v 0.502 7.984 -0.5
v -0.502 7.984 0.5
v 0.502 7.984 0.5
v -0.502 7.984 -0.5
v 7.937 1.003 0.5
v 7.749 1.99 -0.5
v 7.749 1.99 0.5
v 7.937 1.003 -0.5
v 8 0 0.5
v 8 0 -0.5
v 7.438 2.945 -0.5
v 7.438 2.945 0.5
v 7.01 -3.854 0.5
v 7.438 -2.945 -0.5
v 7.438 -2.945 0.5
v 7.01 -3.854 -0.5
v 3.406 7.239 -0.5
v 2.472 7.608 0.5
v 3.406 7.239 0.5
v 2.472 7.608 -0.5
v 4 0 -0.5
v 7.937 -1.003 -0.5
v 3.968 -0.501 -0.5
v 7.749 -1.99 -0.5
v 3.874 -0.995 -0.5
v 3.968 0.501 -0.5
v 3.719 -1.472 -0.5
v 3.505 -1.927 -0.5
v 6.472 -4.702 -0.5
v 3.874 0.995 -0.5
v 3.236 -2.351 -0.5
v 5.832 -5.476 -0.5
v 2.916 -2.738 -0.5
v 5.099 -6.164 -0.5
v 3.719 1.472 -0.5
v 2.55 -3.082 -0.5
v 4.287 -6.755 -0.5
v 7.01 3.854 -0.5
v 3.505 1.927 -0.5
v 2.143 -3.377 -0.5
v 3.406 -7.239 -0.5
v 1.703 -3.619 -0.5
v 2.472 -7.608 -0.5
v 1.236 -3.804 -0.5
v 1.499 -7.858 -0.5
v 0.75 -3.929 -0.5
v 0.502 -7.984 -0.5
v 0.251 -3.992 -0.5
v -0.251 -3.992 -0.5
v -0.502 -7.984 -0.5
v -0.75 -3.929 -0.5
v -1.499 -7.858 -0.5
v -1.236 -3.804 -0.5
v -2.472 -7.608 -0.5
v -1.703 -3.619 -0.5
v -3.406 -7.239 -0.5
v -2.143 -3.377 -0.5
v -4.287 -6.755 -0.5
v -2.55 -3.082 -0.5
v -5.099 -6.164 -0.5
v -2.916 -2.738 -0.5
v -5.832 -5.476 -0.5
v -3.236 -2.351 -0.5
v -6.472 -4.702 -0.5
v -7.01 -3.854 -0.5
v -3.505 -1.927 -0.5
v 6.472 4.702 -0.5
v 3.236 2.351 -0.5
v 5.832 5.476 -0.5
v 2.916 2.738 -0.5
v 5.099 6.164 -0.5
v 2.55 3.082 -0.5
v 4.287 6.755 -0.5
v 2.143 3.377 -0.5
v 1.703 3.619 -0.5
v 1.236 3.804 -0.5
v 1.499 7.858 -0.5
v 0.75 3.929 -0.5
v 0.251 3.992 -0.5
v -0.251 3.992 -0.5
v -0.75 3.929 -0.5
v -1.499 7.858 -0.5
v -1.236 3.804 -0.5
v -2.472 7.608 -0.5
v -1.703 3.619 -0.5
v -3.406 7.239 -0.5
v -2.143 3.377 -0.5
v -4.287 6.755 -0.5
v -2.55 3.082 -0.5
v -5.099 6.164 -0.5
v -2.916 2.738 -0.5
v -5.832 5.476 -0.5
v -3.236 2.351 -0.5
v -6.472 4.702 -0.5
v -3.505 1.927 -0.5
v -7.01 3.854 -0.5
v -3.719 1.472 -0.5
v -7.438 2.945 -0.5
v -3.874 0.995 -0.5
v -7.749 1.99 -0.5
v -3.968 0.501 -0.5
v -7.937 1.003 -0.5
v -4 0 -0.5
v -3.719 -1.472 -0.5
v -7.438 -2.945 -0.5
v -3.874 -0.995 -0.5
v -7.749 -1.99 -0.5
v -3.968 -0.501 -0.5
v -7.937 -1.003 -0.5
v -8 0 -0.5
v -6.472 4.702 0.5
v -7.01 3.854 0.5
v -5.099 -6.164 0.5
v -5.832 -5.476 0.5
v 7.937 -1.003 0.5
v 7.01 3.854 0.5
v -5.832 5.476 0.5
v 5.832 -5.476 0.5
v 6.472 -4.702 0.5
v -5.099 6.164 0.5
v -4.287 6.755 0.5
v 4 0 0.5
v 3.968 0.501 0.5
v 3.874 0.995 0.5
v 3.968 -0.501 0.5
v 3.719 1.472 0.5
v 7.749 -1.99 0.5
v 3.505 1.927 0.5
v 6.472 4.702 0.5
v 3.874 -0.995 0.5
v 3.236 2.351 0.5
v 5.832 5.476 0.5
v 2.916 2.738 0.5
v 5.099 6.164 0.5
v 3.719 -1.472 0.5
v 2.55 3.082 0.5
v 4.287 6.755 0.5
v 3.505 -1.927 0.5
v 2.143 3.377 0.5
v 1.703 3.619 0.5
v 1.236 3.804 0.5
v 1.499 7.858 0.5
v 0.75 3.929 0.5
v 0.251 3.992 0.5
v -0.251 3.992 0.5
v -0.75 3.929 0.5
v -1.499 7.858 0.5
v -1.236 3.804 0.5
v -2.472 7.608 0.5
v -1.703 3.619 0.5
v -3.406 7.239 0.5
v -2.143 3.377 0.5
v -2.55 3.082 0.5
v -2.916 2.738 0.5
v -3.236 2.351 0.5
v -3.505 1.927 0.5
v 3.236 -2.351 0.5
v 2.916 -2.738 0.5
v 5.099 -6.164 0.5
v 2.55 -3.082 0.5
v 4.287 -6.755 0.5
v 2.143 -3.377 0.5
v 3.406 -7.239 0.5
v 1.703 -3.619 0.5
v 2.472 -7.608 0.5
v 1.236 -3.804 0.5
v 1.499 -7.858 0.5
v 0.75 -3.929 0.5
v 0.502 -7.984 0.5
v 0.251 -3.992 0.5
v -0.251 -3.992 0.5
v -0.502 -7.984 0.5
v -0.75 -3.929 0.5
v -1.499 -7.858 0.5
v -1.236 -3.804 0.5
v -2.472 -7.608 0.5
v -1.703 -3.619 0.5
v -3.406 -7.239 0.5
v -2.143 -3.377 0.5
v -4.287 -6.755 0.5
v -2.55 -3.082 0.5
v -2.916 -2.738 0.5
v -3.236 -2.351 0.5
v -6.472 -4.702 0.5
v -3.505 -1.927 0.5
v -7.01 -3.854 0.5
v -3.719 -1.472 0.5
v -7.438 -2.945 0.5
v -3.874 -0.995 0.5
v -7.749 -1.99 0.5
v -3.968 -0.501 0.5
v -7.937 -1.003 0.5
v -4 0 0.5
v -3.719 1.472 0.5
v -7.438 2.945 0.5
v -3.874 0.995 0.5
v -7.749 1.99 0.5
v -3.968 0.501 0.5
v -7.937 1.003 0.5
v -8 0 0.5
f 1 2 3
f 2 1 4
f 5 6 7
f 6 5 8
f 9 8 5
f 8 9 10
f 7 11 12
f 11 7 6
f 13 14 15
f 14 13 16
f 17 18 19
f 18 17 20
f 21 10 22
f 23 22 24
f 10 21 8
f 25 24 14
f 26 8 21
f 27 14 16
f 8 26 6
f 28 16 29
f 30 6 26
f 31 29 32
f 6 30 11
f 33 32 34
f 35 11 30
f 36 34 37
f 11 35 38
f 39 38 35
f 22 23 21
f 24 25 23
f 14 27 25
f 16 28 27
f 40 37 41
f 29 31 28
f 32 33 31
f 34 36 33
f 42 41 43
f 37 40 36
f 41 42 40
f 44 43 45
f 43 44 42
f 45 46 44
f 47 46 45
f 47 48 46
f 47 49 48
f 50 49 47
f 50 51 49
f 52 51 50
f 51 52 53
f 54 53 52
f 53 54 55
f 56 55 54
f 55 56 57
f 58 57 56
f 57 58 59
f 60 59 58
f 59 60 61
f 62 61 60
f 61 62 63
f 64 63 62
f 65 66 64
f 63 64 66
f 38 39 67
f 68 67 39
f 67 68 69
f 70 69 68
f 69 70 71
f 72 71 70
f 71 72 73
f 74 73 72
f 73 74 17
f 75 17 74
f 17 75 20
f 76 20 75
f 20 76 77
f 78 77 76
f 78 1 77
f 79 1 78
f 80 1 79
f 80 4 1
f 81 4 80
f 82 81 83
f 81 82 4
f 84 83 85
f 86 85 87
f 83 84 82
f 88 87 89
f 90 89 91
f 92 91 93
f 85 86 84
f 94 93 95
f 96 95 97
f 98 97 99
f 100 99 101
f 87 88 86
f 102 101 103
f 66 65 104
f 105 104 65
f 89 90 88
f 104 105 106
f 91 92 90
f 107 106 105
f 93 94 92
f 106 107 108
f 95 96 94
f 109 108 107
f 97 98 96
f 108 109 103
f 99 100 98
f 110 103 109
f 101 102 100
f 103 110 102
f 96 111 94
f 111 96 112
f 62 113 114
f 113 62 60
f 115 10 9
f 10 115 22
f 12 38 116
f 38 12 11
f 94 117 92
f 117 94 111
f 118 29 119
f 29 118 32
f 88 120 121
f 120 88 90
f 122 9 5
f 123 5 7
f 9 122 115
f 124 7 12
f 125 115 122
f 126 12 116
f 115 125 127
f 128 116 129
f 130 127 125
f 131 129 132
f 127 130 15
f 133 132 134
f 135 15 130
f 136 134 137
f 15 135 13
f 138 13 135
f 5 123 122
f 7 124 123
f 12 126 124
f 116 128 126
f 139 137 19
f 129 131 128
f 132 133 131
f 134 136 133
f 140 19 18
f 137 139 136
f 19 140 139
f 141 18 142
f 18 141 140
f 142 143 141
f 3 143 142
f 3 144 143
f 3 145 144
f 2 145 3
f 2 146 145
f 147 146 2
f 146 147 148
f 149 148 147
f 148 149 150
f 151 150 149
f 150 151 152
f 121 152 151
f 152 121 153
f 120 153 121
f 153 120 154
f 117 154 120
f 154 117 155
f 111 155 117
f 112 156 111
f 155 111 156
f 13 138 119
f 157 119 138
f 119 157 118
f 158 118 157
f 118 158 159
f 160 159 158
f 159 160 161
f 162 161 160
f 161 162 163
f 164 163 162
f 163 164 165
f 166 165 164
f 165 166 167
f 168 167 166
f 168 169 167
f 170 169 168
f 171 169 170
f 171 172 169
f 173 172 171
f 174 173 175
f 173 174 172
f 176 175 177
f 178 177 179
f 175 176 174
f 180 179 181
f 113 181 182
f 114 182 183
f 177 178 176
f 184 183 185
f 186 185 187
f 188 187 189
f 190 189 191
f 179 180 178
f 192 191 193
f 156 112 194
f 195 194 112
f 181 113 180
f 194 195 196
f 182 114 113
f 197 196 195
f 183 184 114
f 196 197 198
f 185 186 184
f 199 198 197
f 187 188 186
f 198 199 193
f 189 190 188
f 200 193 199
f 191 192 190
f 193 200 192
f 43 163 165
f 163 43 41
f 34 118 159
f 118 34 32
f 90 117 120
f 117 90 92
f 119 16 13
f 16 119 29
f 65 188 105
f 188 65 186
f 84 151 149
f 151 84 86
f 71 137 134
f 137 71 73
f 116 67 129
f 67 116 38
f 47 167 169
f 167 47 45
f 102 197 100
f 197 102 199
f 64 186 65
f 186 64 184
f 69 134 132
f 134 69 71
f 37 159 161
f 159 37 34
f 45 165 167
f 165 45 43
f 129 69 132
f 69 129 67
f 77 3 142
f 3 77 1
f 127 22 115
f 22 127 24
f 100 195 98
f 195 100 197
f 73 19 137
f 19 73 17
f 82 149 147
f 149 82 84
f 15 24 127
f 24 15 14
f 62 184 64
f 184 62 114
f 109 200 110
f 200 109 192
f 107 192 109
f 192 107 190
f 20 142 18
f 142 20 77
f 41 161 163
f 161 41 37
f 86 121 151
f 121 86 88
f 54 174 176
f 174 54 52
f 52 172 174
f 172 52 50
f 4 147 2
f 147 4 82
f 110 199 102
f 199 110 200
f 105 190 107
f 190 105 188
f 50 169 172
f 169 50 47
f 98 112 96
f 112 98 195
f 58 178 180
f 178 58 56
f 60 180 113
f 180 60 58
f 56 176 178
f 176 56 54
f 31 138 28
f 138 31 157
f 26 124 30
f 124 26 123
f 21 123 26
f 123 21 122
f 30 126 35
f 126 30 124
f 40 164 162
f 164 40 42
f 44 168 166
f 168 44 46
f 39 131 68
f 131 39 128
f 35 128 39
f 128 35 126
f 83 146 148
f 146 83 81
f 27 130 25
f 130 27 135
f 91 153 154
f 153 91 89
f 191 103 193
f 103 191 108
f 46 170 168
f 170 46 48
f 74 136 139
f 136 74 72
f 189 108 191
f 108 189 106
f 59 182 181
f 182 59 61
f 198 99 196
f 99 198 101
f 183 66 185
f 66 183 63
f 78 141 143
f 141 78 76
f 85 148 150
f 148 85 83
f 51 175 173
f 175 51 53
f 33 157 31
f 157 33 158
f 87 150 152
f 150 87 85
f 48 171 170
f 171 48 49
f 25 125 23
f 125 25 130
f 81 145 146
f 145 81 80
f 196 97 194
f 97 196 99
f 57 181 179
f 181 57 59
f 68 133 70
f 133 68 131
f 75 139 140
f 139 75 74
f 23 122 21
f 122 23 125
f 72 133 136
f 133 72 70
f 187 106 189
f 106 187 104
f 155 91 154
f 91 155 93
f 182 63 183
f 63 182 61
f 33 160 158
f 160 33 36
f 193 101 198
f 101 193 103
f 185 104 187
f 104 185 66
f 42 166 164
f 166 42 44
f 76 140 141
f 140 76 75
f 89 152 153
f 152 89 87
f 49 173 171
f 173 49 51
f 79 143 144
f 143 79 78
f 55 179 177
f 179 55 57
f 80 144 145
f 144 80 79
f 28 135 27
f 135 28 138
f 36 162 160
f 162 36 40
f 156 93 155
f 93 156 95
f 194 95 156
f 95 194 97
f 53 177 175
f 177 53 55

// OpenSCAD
$fn = 50;


difference() {
	union() {
		translate(v = [0, 0, -0.5000000000]) {
			cylinder(h = 1, r = 8.0000000000);
		}
	}
	union() {
		translate(v = [0, 0, -100.0000000000]) {
			cylinder(h = 200, r = 4.0000000000);
		}
	}
}
